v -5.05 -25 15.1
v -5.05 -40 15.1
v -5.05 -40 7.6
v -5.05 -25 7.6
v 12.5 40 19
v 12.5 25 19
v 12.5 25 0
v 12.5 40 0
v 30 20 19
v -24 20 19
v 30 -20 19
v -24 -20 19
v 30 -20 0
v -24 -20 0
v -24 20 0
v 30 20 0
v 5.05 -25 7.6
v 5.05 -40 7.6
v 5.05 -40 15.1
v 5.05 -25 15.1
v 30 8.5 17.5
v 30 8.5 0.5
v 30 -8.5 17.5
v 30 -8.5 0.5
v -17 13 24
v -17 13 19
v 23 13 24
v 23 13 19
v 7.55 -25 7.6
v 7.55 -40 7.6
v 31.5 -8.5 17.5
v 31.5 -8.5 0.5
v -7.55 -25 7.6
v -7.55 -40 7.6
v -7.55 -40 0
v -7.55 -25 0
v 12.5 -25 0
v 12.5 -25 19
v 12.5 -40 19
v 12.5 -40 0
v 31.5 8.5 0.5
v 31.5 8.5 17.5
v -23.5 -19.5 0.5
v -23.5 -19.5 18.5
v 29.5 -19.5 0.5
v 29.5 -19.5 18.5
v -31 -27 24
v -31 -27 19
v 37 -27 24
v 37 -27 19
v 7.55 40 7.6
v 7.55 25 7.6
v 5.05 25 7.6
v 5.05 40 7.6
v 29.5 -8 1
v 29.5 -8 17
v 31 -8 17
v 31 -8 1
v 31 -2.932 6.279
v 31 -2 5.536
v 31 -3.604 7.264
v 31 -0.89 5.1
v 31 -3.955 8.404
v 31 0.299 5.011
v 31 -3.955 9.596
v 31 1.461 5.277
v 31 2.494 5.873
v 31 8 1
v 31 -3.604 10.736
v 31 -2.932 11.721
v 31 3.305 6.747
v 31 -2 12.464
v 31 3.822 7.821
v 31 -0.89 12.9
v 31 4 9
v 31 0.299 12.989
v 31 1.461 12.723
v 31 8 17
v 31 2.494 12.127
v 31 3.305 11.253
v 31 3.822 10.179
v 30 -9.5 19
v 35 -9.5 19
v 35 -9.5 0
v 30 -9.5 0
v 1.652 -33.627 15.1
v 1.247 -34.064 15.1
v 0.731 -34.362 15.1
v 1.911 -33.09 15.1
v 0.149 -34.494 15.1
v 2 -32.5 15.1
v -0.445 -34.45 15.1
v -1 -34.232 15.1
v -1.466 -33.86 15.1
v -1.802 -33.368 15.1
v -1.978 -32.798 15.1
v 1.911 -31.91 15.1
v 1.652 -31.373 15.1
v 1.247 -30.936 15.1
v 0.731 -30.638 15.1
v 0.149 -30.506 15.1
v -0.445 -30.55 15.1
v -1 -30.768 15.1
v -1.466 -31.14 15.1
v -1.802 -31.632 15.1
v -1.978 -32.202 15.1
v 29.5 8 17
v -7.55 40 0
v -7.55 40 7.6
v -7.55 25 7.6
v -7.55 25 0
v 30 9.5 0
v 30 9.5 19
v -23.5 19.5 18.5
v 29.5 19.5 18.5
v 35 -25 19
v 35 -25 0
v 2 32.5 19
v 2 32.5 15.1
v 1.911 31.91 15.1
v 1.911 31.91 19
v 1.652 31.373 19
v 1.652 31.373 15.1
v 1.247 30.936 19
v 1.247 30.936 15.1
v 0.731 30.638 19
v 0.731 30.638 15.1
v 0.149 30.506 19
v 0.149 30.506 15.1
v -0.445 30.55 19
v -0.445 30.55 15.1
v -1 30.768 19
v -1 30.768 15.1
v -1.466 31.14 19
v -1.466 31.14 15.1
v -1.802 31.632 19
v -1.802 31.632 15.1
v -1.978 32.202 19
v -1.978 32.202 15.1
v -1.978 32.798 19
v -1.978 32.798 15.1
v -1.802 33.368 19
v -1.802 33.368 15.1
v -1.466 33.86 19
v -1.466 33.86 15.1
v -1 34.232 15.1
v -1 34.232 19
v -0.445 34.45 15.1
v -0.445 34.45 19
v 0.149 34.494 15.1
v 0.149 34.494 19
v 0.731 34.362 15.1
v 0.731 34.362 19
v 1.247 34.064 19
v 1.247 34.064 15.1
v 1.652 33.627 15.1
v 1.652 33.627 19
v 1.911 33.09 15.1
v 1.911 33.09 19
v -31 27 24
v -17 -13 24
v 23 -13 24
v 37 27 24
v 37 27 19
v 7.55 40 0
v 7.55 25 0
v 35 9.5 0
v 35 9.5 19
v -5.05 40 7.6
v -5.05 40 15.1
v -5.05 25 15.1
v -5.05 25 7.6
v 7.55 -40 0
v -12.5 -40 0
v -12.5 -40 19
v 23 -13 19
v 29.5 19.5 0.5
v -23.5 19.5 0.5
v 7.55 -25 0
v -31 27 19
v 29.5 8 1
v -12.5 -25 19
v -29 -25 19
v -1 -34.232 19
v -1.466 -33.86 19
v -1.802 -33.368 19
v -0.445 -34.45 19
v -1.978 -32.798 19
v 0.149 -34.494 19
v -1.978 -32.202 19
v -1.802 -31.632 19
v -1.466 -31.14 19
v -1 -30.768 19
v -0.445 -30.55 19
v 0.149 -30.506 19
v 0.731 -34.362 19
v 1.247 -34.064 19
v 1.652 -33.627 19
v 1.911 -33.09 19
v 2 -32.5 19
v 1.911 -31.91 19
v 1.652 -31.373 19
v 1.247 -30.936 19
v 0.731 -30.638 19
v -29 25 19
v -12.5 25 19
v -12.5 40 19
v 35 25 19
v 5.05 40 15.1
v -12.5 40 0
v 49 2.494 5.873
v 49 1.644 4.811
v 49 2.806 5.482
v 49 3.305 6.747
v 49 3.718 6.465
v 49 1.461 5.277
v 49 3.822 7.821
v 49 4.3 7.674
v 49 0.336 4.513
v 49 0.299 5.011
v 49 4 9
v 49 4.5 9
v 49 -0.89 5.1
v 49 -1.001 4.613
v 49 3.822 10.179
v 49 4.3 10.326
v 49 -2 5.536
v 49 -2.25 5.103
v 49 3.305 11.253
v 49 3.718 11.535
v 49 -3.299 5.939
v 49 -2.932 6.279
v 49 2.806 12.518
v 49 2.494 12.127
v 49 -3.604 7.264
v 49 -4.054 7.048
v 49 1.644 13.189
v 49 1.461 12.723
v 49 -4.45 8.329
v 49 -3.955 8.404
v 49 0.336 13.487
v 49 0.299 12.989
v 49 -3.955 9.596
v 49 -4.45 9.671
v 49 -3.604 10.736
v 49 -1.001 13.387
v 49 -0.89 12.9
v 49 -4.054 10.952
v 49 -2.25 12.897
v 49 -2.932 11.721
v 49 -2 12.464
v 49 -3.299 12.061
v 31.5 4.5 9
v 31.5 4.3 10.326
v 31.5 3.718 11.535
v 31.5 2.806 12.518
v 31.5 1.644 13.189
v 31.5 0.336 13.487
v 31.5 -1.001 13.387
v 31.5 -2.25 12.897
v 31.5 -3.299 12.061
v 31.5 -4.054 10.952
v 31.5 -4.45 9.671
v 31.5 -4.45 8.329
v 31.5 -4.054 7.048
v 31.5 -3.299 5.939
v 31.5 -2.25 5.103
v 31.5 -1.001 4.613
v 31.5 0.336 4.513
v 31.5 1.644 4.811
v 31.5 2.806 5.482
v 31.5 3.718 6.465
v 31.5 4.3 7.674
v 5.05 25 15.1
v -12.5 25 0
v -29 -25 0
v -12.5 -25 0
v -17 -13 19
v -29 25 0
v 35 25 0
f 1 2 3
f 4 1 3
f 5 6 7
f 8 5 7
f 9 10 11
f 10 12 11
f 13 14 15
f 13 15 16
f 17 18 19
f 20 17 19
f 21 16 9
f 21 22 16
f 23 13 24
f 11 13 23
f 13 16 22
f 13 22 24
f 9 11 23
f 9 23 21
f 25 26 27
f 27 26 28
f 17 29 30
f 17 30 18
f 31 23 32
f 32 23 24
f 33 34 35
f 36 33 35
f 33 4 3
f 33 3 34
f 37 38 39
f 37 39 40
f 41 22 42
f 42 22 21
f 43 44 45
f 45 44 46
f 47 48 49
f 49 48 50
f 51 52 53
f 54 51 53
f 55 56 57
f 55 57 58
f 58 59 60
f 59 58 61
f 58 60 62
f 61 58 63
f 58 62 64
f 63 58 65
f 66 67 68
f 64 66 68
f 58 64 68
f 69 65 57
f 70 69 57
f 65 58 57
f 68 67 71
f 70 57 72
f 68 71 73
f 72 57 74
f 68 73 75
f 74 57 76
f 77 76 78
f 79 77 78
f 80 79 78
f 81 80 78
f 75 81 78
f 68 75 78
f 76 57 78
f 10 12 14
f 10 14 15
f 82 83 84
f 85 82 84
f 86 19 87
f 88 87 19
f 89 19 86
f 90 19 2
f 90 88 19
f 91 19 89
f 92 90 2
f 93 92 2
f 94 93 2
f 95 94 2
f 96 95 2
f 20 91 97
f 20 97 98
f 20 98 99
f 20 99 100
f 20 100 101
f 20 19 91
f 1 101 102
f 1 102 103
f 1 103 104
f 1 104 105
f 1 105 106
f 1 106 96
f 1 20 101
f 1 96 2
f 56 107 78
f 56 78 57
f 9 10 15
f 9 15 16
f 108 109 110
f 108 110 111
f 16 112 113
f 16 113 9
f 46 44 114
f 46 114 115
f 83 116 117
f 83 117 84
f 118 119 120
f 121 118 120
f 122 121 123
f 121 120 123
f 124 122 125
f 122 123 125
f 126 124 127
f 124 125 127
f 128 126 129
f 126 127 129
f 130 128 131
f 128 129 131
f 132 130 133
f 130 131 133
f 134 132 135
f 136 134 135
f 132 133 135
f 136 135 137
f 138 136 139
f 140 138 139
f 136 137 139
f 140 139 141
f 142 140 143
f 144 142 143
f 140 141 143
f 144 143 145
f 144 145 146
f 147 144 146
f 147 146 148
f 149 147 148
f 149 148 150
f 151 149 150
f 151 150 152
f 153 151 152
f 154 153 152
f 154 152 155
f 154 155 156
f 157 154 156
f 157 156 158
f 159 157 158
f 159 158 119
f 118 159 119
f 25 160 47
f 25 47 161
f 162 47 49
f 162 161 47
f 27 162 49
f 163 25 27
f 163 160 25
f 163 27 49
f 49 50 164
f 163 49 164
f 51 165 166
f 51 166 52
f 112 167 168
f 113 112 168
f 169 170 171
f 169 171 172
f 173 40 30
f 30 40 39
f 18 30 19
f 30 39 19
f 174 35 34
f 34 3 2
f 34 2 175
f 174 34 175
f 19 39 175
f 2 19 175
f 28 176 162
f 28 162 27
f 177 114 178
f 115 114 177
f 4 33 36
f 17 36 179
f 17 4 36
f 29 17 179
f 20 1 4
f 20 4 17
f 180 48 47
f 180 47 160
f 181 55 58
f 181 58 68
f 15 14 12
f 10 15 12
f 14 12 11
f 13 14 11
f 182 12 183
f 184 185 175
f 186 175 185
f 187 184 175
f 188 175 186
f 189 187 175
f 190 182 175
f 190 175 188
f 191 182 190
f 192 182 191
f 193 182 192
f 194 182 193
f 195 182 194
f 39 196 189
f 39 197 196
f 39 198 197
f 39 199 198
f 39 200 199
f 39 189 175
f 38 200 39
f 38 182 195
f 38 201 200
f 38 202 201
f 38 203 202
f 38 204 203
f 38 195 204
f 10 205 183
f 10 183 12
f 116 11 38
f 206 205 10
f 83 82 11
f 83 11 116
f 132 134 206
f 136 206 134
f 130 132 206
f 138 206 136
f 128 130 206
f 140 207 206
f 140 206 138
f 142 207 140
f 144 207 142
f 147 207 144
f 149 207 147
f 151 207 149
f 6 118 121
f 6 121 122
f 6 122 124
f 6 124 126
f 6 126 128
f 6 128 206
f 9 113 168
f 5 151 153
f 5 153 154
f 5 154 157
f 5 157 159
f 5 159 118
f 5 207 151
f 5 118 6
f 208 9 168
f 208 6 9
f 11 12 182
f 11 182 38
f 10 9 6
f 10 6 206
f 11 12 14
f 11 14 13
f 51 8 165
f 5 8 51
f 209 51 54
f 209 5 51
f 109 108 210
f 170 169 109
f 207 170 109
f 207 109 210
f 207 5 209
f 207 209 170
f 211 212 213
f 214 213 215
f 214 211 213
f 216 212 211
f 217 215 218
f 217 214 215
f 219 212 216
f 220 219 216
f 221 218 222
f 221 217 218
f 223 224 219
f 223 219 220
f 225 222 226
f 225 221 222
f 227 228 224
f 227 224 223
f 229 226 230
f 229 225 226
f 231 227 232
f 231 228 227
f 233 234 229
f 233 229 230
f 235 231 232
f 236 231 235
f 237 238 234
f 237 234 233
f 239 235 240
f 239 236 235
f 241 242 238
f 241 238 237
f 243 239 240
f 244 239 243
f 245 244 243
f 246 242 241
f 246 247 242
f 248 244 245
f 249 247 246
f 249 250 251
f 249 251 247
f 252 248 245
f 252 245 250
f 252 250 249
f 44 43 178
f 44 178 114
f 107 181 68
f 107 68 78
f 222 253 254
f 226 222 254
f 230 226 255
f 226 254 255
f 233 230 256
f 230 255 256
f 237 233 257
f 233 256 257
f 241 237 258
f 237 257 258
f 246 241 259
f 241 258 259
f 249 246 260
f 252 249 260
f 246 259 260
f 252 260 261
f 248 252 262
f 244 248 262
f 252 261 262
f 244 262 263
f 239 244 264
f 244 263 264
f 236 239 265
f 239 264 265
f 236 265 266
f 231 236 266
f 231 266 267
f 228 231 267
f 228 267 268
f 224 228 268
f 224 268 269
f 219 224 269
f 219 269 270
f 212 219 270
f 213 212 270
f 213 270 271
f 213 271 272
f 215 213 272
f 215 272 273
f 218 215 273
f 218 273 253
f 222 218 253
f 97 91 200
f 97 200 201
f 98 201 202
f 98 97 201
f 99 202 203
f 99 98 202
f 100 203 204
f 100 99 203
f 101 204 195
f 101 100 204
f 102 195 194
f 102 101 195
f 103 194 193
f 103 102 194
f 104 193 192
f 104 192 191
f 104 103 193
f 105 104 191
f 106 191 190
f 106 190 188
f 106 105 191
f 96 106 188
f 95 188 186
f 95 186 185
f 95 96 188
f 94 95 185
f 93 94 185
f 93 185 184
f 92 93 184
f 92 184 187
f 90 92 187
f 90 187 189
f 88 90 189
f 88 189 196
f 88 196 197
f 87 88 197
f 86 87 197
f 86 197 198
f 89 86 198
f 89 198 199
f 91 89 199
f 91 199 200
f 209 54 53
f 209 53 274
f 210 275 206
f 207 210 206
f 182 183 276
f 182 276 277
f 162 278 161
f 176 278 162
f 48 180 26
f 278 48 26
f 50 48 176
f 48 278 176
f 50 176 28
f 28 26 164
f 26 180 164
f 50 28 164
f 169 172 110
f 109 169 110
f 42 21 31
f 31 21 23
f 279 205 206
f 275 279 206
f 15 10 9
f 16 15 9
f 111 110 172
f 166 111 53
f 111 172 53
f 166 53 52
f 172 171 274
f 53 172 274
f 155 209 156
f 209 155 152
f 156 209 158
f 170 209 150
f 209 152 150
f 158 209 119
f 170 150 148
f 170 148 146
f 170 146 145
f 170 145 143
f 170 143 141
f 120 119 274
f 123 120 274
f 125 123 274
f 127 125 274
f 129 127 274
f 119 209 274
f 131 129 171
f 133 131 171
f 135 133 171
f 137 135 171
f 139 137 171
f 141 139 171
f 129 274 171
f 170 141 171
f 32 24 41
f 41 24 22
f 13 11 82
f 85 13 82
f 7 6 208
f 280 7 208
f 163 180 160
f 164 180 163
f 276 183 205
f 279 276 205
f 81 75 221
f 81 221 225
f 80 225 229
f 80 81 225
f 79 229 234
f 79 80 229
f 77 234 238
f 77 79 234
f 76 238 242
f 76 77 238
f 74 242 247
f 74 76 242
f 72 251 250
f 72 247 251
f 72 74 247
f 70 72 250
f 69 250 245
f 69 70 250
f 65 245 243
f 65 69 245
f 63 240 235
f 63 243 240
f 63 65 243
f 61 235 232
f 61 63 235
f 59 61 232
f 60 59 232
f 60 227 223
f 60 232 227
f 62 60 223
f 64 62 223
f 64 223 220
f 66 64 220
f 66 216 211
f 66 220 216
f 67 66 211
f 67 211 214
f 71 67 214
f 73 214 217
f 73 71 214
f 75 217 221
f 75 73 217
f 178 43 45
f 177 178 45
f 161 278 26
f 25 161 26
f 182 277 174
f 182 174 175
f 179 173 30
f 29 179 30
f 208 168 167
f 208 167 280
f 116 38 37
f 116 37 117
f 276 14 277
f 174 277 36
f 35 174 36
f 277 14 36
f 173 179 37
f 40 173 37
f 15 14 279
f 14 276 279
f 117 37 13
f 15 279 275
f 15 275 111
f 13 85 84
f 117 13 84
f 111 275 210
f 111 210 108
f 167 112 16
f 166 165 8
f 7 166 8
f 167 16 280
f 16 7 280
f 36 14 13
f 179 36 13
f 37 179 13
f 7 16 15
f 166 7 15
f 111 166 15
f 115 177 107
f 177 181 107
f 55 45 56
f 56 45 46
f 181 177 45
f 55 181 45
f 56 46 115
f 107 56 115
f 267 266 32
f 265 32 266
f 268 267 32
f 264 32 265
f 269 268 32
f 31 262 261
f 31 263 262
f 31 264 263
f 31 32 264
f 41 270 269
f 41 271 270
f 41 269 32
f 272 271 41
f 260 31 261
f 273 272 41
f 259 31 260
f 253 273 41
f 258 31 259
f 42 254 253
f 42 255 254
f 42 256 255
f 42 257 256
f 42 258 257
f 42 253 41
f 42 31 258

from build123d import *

# Parameters (mm, degrees)
F0_W      = 54
F0_H      = 19
F1_DEPTH  = 20
F2_R      = 4.5
F3_DEPTH  = 1.5
F4_DEPTH  = 19
F5_T      = -0.5
F6_W      = 64
F6_H      = 50
F6_W_2    = 54
F6_H_2    = 40
F7_DEPTH  = 19
F9_DEPTH  = 25
F10_W     = 68
F10_H     = 54
F10_W_2   = 64
F10_H_2   = 50
F11_DEPTH = 5
F10_W_3   = 54
F10_H_3   = 40
F10_W_4   = 40
F10_H_4   = 26
F14_DEPTH = 15
F15_R     = 2
F16_DEPTH = 8.901


with BuildPart() as f1:
    # F0 (on Front) → F1 (new body, symmetric)
    with BuildSketch(Plane.XZ):
        with Locations((3, 9.5)):
            Rectangle(F0_W, F0_H)
    extrude(amount=F1_DEPTH, both=True)

    # F2 (on face) → F3 (join)
    with BuildSketch(Plane.YZ.offset(30)):
        Polygon((-8.5, 17.5), (-8.5, 0.5), (0, 0.5), (8.5, 0.5), (8.5, 17.5), (0, 17.5), align=None)
        with Locations((0, 9)):
            Circle(F2_R, mode=Mode.SUBTRACT)
    extrude(amount=F3_DEPTH)

    # F4 (add): a face of the model
    f4_faces = [f1.faces().sort_by_distance(p)[0] for p in [
        (30, 0, 9),
    ]]
    extrude(f4_faces, amount=F4_DEPTH)

    # F5
    f5_openings = [f1.faces().sort_by_distance(p)[0] for p in [
        (49, 0, 9),
    ]]
    offset(amount=F5_T, openings=f5_openings, kind=Kind.INTERSECTION)


with BuildPart() as f7:
    # F6 (on face) → F7 (new body, through all)
    with BuildSketch(Plane.XY.offset(19)):
        with Locations((3, 0)):
            Rectangle(F6_W, F6_H)
        with Locations((3, 0)):
            Rectangle(F6_W_2, F6_H_2, mode=Mode.SUBTRACT)
    extrude(amount=-F7_DEPTH)

    # F8 (on face) → F9 (cut)
    with BuildSketch(Plane.YZ.offset(35)):
        Polygon((0, -0.5), (9.5, -0.5), (9.5, 19), (0, 19), (-9.5, 19), (-9.5, -0.5), align=None)
    extrude(amount=-F9_DEPTH, mode=Mode.SUBTRACT)

    # F12 (on face) → F14 (join)
    with BuildSketch(Plane(origin=(0, 25, 0), x_dir=(-1, 0, 0), z_dir=(0, 1, 0))):
        Polygon((-12.5, 0), (-7.55, 0), (-7.55, 7.6), (-5.05, 7.6), (-5.05, 15.1), (0, 15.1), (5.05, 15.1), (5.05, 7.6), (7.55, 7.6), (7.55, 0), (12.5, 0), (12.5, 19), (0, 19), (-12.5, 19), align=None)
    extrude(amount=F14_DEPTH)

    # F15 (on face) → F16 (cut, through all)
    with BuildSketch(Plane(origin=(0, 0, 15.1), x_dir=(1, 0, 0), z_dir=(0, 0, -1))):
        with Locations((0, -32.5)):
            Circle(F15_R)
    extrude(amount=-F16_DEPTH, mode=Mode.SUBTRACT)

    # F17: F7 across plane


with BuildPart() as f11:
    # F10 (on face) → F11 (new body)
    with BuildSketch(Plane.XY.offset(19)):
        with Locations((3, 0)):
            Rectangle(F10_W, F10_H)
        with Locations((3, 0)):
            Rectangle(F10_W_2, F10_H_2, mode=Mode.SUBTRACT)
    extrude(amount=F11_DEPTH)



with BuildPart() as f11b:
    # F10 (on face) → F11, piece 2 (new body)
    with BuildSketch(Plane.XY.offset(19)):
        with Locations((3, 0)):
            Rectangle(F10_W_3, F10_H_3)
        with Locations((3, 0)):
            Rectangle(F10_W_4, F10_H_4, mode=Mode.SUBTRACT)
    extrude(amount=F11_DEPTH)


with BuildPart() as f11_1:
    add(f11.part)

    add(f11b.part)  # F11#3 merges F11b
    # F6 (on face) → F11, piece 3 (join)
    with BuildSketch(Plane.XY.offset(19)):
        with Locations((3, 0)):
            Rectangle(F6_W, F6_H)
        with Locations((3, 0)):
            Rectangle(F6_W_2, F6_H_2, mode=Mode.SUBTRACT)
    extrude(amount=F11_DEPTH)


with BuildPart() as f7_1:
    add(f7.part)
    add(f7.part.mirror(Plane.XZ))


solid = Compound([f1.part, f11_1.part, f7_1.part])
